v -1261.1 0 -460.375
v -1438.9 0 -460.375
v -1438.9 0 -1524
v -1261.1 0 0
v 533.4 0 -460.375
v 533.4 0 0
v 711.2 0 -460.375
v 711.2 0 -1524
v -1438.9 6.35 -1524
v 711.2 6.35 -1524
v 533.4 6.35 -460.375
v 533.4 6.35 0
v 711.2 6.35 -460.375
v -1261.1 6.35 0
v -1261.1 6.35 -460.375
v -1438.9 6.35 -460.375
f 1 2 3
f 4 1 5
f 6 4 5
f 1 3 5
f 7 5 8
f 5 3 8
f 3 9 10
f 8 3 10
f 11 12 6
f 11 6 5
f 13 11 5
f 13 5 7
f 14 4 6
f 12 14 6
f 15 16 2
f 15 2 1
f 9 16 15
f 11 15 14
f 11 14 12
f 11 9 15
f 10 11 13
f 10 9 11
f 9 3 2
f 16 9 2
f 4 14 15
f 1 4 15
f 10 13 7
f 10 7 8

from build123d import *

# Parameters (mm, degrees)
BOSS_EXTRUDE1_DEPTH = 6.35
SKETCH2_W           = 177.8
SKETCH2_H           = 460.375
CUT_EXTRUDE1_DEPTH  = 7.35
SKETCH3_W           = 2150.099514553
SKETCH3_H           = 1524
CUT_EXTRUDE2_DEPTH  = 7.35


with BuildPart() as part:
    # Sketch1 → Boss-Extrude1 (new body)
    with BuildSketch(Plane(origin=(0, 0, 0), x_dir=(1, 0, 0), z_dir=(0, 1, 0))):
        Polygon((-914.4, 0), (914.4, 0), (914.4, 3048), (-914.4, 3048), (-1438.899514553, 3048), (-1438.899514553, 0), align=None)
    extrude(amount=BOSS_EXTRUDE1_DEPTH)

    # Sketch2 → Cut-Extrude1 (cut, through all)
    with BuildSketch(Plane(origin=(0, 6.35, 0), x_dir=(1, 0, 0), z_dir=(0, 1, 0))):
        Polygon((914.4, 0), (533.4, 0), (533.4, 460.375), (711.2, 460.375), (711.2, 2587.625), (533.4, 2587.625), (533.4, 3048), (914.4, 3048), (914.4, 2587.625), (914.4, 460.375), align=None)
        with Locations((-1349.999514553, 230.1875)):
            Rectangle(SKETCH2_W, SKETCH2_H)
        with Locations((-1349.999514553, 2817.8125)):
            Rectangle(SKETCH2_W, SKETCH2_H)
    extrude(amount=-CUT_EXTRUDE1_DEPTH, mode=Mode.SUBTRACT)

    # Sketch3 → Cut-Extrude2 (cut, through all)
    with BuildSketch(Plane(origin=(0, 6.35, 0), x_dir=(1, 0, 0), z_dir=(0, 1, 0))):
        with Locations((-363.849757276, 2286)):
            Rectangle(SKETCH3_W, SKETCH3_H)
    extrude(amount=-CUT_EXTRUDE2_DEPTH, mode=Mode.SUBTRACT)


solid = part.part
